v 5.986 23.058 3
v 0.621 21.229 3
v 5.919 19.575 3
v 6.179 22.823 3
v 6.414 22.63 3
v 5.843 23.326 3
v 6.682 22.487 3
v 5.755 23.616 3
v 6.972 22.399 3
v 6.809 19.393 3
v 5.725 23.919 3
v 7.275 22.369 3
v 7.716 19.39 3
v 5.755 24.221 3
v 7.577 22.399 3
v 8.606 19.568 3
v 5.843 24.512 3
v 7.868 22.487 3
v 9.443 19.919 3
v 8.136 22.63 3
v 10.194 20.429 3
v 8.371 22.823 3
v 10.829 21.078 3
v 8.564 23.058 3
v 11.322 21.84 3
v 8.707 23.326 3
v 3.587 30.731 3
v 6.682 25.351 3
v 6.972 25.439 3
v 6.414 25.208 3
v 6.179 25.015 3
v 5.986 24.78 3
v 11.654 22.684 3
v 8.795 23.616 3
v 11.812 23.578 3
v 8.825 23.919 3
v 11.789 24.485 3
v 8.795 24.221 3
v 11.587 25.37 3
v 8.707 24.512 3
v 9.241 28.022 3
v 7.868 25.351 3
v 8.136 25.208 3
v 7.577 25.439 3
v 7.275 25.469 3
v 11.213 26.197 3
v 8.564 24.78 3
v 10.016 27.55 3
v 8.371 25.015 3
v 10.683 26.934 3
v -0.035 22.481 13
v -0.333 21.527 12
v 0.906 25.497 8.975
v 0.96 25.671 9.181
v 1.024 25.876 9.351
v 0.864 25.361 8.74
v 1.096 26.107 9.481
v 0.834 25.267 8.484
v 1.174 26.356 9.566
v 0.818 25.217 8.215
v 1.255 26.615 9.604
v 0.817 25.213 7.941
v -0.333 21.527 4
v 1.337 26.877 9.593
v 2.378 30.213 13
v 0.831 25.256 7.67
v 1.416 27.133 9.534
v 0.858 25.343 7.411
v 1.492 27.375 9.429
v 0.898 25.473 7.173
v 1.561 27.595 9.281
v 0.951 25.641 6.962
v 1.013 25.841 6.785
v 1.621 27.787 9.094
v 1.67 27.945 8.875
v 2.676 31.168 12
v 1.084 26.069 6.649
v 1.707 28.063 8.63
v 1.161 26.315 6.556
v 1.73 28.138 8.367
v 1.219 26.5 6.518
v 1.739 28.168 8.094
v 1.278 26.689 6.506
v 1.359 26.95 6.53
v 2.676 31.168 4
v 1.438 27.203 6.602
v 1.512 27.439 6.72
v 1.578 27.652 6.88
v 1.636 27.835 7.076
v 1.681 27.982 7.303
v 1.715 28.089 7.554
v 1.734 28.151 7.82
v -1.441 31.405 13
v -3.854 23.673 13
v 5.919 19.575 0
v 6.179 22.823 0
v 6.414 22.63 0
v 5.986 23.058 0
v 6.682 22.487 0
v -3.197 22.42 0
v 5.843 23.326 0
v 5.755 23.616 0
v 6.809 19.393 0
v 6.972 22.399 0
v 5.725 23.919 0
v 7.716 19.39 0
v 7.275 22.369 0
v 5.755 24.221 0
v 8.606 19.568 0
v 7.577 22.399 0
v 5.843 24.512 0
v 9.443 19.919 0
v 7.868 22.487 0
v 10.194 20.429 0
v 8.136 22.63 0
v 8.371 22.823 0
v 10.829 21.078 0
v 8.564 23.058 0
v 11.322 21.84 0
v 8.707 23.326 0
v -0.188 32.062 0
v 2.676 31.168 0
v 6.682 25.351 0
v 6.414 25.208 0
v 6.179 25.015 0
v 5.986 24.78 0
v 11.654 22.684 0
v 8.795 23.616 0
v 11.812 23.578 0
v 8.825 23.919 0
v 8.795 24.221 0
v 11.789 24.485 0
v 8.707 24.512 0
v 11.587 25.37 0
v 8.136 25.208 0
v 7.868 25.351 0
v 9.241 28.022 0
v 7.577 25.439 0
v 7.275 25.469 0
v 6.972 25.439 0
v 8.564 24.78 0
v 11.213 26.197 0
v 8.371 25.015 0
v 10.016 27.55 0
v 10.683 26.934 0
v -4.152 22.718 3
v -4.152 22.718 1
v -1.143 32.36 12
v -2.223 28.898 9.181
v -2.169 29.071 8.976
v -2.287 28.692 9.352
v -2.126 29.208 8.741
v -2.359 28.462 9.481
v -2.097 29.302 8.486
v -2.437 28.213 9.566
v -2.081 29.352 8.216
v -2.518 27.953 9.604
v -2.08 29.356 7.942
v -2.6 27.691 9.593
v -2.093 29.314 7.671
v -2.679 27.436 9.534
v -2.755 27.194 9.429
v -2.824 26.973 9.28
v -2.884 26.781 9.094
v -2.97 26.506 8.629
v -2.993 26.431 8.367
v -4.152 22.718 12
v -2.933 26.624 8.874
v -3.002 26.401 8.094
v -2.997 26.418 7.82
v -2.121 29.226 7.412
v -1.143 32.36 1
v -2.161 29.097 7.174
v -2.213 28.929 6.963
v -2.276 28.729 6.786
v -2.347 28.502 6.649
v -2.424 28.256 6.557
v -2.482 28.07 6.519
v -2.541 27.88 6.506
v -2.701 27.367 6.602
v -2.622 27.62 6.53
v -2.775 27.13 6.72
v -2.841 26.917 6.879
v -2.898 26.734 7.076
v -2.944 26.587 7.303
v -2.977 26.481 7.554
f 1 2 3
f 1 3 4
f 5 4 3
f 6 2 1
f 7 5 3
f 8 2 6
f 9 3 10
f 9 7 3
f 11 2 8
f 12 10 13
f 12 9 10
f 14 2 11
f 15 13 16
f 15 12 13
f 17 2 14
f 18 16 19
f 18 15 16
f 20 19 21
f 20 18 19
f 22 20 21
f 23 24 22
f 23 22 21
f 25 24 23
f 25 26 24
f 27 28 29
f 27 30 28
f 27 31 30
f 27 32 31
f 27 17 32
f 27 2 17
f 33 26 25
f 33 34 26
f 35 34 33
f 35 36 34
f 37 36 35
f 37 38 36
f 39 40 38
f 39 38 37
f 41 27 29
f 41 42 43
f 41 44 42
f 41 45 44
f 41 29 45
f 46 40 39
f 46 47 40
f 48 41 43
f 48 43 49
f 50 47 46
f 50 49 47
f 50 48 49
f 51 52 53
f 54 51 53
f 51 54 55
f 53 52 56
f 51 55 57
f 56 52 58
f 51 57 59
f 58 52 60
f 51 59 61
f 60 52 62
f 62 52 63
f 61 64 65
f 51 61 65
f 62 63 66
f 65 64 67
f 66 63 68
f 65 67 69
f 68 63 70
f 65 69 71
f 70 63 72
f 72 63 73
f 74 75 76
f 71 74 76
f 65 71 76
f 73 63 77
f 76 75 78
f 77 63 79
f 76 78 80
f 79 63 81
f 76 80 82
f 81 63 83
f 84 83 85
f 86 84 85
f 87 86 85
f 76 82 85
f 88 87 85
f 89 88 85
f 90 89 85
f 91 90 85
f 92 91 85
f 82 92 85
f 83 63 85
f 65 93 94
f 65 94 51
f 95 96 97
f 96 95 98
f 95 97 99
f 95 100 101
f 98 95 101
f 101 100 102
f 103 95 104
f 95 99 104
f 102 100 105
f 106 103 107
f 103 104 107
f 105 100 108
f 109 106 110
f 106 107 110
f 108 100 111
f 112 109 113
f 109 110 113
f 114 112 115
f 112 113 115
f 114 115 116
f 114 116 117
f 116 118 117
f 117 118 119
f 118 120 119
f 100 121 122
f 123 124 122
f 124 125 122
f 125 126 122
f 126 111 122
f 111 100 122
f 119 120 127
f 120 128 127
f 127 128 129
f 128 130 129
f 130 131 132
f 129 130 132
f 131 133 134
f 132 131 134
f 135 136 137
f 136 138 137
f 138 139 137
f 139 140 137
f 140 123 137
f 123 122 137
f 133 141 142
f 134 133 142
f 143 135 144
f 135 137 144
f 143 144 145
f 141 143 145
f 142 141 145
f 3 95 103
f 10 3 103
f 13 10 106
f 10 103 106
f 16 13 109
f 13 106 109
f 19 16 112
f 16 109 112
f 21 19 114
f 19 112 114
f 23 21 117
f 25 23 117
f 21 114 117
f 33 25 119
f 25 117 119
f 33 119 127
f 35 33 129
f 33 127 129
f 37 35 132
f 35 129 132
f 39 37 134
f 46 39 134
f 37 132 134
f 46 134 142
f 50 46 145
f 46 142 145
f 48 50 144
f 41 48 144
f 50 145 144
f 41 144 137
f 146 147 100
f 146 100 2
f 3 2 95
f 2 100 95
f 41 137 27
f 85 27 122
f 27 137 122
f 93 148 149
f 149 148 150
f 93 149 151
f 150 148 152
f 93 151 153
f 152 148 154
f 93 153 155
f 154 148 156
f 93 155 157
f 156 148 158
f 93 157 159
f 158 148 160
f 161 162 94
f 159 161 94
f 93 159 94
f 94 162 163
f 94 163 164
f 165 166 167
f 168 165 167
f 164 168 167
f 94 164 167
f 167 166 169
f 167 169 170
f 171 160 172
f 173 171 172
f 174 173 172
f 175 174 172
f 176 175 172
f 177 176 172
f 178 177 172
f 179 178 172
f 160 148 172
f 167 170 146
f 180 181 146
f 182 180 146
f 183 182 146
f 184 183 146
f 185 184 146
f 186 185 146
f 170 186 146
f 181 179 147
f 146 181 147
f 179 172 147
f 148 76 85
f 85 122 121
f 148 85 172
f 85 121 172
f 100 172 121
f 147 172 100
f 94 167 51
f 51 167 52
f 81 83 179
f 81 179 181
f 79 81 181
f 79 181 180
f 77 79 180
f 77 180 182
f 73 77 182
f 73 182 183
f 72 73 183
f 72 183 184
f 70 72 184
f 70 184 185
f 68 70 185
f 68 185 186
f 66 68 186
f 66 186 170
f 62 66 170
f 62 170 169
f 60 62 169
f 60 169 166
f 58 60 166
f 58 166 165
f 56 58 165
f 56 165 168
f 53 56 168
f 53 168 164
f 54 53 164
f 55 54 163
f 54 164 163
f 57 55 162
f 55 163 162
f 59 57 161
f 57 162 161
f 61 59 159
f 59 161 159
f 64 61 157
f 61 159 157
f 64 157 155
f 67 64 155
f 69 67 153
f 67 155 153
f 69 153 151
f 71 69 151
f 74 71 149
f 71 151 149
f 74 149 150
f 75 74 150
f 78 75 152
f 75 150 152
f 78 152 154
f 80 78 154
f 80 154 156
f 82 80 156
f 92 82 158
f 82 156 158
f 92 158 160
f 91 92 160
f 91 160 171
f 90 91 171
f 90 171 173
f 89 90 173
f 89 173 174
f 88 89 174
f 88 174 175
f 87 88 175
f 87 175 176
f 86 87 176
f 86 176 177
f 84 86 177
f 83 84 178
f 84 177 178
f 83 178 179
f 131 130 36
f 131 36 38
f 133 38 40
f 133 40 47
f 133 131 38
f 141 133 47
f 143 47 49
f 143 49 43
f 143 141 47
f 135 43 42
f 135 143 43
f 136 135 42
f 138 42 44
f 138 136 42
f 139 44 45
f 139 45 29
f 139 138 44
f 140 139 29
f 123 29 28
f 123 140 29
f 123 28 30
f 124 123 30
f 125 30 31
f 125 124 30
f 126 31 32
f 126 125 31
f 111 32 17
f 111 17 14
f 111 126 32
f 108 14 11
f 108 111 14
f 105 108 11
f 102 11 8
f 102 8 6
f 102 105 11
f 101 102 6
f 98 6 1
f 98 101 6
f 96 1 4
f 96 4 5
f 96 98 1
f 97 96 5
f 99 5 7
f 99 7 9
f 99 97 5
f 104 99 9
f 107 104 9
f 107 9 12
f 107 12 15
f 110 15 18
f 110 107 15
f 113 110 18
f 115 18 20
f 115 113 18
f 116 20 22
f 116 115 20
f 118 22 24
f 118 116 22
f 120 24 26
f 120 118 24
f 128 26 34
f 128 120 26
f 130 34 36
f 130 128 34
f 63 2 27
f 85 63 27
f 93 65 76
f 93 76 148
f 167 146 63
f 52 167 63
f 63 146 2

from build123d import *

# Parameters (mm, degrees)
SKETCH1_R           = 1.55
BOSS_EXTRUDE1_DEPTH = 3
BOSS_EXTRUDE2_DEPTH = 10
CUT_EXTRUDE1_REACH  = 18.249
SKETCH3_RX          = 1.55
SKETCH3_RY          = 1.549991194
CHAMFER1_SIZE       = 1
CHAMFER2_SIZE       = 1
CHAMFER3_SIZE       = 1


with BuildPart() as part:
    # Sketch1 → Boss-Extrude1 (new body)
    with BuildSketch(Plane.XY):
        with BuildLine():
            Line((9.241088209, 28.022032198), (2.675653796, 31.16807272))
            Line((2.675653796, 31.16807272), (-1.142729479, 32.359688918))
            Line((-1.142729479, 32.359688918), (-4.151560379, 22.718271148))
            Line((-4.151560379, 22.718271148), (5.91942551, 19.575383426))
            ThreePointArc((5.91942551, 19.575383426), (11.509238759, 22.253627274), (9.241088209, 28.022032198))
        make_face()
        with Locations((7.274888935, 23.918794401)):
            Circle(SKETCH1_R, mode=Mode.SUBTRACT)
    extrude(amount=BOSS_EXTRUDE1_DEPTH)

    # Sketch2 → Boss-Extrude2 (add)
    with BuildSketch(Plane.XY.offset(3)):
        Polygon((-1.142729479, 32.359688918), (-4.151560379, 22.718271148), (-0.333177104, 21.52665495), (2.675653796, 31.16807272), align=None)
    extrude(amount=BOSS_EXTRUDE2_DEPTH)

    # Sketch3 → Cut-Extrude1 (cut, up to next)
    with BuildSketch(Plane(origin=(-10.243698191, 3.196786653, 0), x_dir=(0, 0, 1), z_dir=(-0.954595819, 0.297904049, 0)), mode=Mode.PRIVATE) as cut_extrude1_sk1:
        with Locations(Location((8.05588909, 25.857711156), (0, 0, -179.999999999))):
            Ellipse(SKETCH3_RX, SKETCH3_RY)
    cut_extrude1_tool1 = extrude(cut_extrude1_sk1.sketch, amount=-CUT_EXTRUDE1_REACH, mode=Mode.PRIVATE) & part.part
    add(cut_extrude1_tool1.solids().sort_by_distance((-2.540581, 27.88045, 8.055889))[0], mode=Mode.SUBTRACT)

    # Chamfer1
    chamfer1_edges = [part.edges().sort_by_distance(p)[0] for p in [
        (-2.242368741, 22.122463049, 13),
        (0.766462159, 31.763880819, 13),
    ]]
    chamfer(chamfer1_edges, length=CHAMFER1_SIZE)

    # Chamfer2
    chamfer2_edges = [part.edges().sort_by_distance(p)[0] for p in [
        (1.171238346, 26.347363835, 3),
    ]]
    chamfer(chamfer2_edges, length=CHAMFER2_SIZE)

    # Chamfer3
    chamfer3_edges = [part.edges().sort_by_distance(p)[0] for p in [
        (-2.647144929, 27.538980033, 0),
    ]]
    chamfer(chamfer3_edges, length=CHAMFER3_SIZE)


solid = part.part
